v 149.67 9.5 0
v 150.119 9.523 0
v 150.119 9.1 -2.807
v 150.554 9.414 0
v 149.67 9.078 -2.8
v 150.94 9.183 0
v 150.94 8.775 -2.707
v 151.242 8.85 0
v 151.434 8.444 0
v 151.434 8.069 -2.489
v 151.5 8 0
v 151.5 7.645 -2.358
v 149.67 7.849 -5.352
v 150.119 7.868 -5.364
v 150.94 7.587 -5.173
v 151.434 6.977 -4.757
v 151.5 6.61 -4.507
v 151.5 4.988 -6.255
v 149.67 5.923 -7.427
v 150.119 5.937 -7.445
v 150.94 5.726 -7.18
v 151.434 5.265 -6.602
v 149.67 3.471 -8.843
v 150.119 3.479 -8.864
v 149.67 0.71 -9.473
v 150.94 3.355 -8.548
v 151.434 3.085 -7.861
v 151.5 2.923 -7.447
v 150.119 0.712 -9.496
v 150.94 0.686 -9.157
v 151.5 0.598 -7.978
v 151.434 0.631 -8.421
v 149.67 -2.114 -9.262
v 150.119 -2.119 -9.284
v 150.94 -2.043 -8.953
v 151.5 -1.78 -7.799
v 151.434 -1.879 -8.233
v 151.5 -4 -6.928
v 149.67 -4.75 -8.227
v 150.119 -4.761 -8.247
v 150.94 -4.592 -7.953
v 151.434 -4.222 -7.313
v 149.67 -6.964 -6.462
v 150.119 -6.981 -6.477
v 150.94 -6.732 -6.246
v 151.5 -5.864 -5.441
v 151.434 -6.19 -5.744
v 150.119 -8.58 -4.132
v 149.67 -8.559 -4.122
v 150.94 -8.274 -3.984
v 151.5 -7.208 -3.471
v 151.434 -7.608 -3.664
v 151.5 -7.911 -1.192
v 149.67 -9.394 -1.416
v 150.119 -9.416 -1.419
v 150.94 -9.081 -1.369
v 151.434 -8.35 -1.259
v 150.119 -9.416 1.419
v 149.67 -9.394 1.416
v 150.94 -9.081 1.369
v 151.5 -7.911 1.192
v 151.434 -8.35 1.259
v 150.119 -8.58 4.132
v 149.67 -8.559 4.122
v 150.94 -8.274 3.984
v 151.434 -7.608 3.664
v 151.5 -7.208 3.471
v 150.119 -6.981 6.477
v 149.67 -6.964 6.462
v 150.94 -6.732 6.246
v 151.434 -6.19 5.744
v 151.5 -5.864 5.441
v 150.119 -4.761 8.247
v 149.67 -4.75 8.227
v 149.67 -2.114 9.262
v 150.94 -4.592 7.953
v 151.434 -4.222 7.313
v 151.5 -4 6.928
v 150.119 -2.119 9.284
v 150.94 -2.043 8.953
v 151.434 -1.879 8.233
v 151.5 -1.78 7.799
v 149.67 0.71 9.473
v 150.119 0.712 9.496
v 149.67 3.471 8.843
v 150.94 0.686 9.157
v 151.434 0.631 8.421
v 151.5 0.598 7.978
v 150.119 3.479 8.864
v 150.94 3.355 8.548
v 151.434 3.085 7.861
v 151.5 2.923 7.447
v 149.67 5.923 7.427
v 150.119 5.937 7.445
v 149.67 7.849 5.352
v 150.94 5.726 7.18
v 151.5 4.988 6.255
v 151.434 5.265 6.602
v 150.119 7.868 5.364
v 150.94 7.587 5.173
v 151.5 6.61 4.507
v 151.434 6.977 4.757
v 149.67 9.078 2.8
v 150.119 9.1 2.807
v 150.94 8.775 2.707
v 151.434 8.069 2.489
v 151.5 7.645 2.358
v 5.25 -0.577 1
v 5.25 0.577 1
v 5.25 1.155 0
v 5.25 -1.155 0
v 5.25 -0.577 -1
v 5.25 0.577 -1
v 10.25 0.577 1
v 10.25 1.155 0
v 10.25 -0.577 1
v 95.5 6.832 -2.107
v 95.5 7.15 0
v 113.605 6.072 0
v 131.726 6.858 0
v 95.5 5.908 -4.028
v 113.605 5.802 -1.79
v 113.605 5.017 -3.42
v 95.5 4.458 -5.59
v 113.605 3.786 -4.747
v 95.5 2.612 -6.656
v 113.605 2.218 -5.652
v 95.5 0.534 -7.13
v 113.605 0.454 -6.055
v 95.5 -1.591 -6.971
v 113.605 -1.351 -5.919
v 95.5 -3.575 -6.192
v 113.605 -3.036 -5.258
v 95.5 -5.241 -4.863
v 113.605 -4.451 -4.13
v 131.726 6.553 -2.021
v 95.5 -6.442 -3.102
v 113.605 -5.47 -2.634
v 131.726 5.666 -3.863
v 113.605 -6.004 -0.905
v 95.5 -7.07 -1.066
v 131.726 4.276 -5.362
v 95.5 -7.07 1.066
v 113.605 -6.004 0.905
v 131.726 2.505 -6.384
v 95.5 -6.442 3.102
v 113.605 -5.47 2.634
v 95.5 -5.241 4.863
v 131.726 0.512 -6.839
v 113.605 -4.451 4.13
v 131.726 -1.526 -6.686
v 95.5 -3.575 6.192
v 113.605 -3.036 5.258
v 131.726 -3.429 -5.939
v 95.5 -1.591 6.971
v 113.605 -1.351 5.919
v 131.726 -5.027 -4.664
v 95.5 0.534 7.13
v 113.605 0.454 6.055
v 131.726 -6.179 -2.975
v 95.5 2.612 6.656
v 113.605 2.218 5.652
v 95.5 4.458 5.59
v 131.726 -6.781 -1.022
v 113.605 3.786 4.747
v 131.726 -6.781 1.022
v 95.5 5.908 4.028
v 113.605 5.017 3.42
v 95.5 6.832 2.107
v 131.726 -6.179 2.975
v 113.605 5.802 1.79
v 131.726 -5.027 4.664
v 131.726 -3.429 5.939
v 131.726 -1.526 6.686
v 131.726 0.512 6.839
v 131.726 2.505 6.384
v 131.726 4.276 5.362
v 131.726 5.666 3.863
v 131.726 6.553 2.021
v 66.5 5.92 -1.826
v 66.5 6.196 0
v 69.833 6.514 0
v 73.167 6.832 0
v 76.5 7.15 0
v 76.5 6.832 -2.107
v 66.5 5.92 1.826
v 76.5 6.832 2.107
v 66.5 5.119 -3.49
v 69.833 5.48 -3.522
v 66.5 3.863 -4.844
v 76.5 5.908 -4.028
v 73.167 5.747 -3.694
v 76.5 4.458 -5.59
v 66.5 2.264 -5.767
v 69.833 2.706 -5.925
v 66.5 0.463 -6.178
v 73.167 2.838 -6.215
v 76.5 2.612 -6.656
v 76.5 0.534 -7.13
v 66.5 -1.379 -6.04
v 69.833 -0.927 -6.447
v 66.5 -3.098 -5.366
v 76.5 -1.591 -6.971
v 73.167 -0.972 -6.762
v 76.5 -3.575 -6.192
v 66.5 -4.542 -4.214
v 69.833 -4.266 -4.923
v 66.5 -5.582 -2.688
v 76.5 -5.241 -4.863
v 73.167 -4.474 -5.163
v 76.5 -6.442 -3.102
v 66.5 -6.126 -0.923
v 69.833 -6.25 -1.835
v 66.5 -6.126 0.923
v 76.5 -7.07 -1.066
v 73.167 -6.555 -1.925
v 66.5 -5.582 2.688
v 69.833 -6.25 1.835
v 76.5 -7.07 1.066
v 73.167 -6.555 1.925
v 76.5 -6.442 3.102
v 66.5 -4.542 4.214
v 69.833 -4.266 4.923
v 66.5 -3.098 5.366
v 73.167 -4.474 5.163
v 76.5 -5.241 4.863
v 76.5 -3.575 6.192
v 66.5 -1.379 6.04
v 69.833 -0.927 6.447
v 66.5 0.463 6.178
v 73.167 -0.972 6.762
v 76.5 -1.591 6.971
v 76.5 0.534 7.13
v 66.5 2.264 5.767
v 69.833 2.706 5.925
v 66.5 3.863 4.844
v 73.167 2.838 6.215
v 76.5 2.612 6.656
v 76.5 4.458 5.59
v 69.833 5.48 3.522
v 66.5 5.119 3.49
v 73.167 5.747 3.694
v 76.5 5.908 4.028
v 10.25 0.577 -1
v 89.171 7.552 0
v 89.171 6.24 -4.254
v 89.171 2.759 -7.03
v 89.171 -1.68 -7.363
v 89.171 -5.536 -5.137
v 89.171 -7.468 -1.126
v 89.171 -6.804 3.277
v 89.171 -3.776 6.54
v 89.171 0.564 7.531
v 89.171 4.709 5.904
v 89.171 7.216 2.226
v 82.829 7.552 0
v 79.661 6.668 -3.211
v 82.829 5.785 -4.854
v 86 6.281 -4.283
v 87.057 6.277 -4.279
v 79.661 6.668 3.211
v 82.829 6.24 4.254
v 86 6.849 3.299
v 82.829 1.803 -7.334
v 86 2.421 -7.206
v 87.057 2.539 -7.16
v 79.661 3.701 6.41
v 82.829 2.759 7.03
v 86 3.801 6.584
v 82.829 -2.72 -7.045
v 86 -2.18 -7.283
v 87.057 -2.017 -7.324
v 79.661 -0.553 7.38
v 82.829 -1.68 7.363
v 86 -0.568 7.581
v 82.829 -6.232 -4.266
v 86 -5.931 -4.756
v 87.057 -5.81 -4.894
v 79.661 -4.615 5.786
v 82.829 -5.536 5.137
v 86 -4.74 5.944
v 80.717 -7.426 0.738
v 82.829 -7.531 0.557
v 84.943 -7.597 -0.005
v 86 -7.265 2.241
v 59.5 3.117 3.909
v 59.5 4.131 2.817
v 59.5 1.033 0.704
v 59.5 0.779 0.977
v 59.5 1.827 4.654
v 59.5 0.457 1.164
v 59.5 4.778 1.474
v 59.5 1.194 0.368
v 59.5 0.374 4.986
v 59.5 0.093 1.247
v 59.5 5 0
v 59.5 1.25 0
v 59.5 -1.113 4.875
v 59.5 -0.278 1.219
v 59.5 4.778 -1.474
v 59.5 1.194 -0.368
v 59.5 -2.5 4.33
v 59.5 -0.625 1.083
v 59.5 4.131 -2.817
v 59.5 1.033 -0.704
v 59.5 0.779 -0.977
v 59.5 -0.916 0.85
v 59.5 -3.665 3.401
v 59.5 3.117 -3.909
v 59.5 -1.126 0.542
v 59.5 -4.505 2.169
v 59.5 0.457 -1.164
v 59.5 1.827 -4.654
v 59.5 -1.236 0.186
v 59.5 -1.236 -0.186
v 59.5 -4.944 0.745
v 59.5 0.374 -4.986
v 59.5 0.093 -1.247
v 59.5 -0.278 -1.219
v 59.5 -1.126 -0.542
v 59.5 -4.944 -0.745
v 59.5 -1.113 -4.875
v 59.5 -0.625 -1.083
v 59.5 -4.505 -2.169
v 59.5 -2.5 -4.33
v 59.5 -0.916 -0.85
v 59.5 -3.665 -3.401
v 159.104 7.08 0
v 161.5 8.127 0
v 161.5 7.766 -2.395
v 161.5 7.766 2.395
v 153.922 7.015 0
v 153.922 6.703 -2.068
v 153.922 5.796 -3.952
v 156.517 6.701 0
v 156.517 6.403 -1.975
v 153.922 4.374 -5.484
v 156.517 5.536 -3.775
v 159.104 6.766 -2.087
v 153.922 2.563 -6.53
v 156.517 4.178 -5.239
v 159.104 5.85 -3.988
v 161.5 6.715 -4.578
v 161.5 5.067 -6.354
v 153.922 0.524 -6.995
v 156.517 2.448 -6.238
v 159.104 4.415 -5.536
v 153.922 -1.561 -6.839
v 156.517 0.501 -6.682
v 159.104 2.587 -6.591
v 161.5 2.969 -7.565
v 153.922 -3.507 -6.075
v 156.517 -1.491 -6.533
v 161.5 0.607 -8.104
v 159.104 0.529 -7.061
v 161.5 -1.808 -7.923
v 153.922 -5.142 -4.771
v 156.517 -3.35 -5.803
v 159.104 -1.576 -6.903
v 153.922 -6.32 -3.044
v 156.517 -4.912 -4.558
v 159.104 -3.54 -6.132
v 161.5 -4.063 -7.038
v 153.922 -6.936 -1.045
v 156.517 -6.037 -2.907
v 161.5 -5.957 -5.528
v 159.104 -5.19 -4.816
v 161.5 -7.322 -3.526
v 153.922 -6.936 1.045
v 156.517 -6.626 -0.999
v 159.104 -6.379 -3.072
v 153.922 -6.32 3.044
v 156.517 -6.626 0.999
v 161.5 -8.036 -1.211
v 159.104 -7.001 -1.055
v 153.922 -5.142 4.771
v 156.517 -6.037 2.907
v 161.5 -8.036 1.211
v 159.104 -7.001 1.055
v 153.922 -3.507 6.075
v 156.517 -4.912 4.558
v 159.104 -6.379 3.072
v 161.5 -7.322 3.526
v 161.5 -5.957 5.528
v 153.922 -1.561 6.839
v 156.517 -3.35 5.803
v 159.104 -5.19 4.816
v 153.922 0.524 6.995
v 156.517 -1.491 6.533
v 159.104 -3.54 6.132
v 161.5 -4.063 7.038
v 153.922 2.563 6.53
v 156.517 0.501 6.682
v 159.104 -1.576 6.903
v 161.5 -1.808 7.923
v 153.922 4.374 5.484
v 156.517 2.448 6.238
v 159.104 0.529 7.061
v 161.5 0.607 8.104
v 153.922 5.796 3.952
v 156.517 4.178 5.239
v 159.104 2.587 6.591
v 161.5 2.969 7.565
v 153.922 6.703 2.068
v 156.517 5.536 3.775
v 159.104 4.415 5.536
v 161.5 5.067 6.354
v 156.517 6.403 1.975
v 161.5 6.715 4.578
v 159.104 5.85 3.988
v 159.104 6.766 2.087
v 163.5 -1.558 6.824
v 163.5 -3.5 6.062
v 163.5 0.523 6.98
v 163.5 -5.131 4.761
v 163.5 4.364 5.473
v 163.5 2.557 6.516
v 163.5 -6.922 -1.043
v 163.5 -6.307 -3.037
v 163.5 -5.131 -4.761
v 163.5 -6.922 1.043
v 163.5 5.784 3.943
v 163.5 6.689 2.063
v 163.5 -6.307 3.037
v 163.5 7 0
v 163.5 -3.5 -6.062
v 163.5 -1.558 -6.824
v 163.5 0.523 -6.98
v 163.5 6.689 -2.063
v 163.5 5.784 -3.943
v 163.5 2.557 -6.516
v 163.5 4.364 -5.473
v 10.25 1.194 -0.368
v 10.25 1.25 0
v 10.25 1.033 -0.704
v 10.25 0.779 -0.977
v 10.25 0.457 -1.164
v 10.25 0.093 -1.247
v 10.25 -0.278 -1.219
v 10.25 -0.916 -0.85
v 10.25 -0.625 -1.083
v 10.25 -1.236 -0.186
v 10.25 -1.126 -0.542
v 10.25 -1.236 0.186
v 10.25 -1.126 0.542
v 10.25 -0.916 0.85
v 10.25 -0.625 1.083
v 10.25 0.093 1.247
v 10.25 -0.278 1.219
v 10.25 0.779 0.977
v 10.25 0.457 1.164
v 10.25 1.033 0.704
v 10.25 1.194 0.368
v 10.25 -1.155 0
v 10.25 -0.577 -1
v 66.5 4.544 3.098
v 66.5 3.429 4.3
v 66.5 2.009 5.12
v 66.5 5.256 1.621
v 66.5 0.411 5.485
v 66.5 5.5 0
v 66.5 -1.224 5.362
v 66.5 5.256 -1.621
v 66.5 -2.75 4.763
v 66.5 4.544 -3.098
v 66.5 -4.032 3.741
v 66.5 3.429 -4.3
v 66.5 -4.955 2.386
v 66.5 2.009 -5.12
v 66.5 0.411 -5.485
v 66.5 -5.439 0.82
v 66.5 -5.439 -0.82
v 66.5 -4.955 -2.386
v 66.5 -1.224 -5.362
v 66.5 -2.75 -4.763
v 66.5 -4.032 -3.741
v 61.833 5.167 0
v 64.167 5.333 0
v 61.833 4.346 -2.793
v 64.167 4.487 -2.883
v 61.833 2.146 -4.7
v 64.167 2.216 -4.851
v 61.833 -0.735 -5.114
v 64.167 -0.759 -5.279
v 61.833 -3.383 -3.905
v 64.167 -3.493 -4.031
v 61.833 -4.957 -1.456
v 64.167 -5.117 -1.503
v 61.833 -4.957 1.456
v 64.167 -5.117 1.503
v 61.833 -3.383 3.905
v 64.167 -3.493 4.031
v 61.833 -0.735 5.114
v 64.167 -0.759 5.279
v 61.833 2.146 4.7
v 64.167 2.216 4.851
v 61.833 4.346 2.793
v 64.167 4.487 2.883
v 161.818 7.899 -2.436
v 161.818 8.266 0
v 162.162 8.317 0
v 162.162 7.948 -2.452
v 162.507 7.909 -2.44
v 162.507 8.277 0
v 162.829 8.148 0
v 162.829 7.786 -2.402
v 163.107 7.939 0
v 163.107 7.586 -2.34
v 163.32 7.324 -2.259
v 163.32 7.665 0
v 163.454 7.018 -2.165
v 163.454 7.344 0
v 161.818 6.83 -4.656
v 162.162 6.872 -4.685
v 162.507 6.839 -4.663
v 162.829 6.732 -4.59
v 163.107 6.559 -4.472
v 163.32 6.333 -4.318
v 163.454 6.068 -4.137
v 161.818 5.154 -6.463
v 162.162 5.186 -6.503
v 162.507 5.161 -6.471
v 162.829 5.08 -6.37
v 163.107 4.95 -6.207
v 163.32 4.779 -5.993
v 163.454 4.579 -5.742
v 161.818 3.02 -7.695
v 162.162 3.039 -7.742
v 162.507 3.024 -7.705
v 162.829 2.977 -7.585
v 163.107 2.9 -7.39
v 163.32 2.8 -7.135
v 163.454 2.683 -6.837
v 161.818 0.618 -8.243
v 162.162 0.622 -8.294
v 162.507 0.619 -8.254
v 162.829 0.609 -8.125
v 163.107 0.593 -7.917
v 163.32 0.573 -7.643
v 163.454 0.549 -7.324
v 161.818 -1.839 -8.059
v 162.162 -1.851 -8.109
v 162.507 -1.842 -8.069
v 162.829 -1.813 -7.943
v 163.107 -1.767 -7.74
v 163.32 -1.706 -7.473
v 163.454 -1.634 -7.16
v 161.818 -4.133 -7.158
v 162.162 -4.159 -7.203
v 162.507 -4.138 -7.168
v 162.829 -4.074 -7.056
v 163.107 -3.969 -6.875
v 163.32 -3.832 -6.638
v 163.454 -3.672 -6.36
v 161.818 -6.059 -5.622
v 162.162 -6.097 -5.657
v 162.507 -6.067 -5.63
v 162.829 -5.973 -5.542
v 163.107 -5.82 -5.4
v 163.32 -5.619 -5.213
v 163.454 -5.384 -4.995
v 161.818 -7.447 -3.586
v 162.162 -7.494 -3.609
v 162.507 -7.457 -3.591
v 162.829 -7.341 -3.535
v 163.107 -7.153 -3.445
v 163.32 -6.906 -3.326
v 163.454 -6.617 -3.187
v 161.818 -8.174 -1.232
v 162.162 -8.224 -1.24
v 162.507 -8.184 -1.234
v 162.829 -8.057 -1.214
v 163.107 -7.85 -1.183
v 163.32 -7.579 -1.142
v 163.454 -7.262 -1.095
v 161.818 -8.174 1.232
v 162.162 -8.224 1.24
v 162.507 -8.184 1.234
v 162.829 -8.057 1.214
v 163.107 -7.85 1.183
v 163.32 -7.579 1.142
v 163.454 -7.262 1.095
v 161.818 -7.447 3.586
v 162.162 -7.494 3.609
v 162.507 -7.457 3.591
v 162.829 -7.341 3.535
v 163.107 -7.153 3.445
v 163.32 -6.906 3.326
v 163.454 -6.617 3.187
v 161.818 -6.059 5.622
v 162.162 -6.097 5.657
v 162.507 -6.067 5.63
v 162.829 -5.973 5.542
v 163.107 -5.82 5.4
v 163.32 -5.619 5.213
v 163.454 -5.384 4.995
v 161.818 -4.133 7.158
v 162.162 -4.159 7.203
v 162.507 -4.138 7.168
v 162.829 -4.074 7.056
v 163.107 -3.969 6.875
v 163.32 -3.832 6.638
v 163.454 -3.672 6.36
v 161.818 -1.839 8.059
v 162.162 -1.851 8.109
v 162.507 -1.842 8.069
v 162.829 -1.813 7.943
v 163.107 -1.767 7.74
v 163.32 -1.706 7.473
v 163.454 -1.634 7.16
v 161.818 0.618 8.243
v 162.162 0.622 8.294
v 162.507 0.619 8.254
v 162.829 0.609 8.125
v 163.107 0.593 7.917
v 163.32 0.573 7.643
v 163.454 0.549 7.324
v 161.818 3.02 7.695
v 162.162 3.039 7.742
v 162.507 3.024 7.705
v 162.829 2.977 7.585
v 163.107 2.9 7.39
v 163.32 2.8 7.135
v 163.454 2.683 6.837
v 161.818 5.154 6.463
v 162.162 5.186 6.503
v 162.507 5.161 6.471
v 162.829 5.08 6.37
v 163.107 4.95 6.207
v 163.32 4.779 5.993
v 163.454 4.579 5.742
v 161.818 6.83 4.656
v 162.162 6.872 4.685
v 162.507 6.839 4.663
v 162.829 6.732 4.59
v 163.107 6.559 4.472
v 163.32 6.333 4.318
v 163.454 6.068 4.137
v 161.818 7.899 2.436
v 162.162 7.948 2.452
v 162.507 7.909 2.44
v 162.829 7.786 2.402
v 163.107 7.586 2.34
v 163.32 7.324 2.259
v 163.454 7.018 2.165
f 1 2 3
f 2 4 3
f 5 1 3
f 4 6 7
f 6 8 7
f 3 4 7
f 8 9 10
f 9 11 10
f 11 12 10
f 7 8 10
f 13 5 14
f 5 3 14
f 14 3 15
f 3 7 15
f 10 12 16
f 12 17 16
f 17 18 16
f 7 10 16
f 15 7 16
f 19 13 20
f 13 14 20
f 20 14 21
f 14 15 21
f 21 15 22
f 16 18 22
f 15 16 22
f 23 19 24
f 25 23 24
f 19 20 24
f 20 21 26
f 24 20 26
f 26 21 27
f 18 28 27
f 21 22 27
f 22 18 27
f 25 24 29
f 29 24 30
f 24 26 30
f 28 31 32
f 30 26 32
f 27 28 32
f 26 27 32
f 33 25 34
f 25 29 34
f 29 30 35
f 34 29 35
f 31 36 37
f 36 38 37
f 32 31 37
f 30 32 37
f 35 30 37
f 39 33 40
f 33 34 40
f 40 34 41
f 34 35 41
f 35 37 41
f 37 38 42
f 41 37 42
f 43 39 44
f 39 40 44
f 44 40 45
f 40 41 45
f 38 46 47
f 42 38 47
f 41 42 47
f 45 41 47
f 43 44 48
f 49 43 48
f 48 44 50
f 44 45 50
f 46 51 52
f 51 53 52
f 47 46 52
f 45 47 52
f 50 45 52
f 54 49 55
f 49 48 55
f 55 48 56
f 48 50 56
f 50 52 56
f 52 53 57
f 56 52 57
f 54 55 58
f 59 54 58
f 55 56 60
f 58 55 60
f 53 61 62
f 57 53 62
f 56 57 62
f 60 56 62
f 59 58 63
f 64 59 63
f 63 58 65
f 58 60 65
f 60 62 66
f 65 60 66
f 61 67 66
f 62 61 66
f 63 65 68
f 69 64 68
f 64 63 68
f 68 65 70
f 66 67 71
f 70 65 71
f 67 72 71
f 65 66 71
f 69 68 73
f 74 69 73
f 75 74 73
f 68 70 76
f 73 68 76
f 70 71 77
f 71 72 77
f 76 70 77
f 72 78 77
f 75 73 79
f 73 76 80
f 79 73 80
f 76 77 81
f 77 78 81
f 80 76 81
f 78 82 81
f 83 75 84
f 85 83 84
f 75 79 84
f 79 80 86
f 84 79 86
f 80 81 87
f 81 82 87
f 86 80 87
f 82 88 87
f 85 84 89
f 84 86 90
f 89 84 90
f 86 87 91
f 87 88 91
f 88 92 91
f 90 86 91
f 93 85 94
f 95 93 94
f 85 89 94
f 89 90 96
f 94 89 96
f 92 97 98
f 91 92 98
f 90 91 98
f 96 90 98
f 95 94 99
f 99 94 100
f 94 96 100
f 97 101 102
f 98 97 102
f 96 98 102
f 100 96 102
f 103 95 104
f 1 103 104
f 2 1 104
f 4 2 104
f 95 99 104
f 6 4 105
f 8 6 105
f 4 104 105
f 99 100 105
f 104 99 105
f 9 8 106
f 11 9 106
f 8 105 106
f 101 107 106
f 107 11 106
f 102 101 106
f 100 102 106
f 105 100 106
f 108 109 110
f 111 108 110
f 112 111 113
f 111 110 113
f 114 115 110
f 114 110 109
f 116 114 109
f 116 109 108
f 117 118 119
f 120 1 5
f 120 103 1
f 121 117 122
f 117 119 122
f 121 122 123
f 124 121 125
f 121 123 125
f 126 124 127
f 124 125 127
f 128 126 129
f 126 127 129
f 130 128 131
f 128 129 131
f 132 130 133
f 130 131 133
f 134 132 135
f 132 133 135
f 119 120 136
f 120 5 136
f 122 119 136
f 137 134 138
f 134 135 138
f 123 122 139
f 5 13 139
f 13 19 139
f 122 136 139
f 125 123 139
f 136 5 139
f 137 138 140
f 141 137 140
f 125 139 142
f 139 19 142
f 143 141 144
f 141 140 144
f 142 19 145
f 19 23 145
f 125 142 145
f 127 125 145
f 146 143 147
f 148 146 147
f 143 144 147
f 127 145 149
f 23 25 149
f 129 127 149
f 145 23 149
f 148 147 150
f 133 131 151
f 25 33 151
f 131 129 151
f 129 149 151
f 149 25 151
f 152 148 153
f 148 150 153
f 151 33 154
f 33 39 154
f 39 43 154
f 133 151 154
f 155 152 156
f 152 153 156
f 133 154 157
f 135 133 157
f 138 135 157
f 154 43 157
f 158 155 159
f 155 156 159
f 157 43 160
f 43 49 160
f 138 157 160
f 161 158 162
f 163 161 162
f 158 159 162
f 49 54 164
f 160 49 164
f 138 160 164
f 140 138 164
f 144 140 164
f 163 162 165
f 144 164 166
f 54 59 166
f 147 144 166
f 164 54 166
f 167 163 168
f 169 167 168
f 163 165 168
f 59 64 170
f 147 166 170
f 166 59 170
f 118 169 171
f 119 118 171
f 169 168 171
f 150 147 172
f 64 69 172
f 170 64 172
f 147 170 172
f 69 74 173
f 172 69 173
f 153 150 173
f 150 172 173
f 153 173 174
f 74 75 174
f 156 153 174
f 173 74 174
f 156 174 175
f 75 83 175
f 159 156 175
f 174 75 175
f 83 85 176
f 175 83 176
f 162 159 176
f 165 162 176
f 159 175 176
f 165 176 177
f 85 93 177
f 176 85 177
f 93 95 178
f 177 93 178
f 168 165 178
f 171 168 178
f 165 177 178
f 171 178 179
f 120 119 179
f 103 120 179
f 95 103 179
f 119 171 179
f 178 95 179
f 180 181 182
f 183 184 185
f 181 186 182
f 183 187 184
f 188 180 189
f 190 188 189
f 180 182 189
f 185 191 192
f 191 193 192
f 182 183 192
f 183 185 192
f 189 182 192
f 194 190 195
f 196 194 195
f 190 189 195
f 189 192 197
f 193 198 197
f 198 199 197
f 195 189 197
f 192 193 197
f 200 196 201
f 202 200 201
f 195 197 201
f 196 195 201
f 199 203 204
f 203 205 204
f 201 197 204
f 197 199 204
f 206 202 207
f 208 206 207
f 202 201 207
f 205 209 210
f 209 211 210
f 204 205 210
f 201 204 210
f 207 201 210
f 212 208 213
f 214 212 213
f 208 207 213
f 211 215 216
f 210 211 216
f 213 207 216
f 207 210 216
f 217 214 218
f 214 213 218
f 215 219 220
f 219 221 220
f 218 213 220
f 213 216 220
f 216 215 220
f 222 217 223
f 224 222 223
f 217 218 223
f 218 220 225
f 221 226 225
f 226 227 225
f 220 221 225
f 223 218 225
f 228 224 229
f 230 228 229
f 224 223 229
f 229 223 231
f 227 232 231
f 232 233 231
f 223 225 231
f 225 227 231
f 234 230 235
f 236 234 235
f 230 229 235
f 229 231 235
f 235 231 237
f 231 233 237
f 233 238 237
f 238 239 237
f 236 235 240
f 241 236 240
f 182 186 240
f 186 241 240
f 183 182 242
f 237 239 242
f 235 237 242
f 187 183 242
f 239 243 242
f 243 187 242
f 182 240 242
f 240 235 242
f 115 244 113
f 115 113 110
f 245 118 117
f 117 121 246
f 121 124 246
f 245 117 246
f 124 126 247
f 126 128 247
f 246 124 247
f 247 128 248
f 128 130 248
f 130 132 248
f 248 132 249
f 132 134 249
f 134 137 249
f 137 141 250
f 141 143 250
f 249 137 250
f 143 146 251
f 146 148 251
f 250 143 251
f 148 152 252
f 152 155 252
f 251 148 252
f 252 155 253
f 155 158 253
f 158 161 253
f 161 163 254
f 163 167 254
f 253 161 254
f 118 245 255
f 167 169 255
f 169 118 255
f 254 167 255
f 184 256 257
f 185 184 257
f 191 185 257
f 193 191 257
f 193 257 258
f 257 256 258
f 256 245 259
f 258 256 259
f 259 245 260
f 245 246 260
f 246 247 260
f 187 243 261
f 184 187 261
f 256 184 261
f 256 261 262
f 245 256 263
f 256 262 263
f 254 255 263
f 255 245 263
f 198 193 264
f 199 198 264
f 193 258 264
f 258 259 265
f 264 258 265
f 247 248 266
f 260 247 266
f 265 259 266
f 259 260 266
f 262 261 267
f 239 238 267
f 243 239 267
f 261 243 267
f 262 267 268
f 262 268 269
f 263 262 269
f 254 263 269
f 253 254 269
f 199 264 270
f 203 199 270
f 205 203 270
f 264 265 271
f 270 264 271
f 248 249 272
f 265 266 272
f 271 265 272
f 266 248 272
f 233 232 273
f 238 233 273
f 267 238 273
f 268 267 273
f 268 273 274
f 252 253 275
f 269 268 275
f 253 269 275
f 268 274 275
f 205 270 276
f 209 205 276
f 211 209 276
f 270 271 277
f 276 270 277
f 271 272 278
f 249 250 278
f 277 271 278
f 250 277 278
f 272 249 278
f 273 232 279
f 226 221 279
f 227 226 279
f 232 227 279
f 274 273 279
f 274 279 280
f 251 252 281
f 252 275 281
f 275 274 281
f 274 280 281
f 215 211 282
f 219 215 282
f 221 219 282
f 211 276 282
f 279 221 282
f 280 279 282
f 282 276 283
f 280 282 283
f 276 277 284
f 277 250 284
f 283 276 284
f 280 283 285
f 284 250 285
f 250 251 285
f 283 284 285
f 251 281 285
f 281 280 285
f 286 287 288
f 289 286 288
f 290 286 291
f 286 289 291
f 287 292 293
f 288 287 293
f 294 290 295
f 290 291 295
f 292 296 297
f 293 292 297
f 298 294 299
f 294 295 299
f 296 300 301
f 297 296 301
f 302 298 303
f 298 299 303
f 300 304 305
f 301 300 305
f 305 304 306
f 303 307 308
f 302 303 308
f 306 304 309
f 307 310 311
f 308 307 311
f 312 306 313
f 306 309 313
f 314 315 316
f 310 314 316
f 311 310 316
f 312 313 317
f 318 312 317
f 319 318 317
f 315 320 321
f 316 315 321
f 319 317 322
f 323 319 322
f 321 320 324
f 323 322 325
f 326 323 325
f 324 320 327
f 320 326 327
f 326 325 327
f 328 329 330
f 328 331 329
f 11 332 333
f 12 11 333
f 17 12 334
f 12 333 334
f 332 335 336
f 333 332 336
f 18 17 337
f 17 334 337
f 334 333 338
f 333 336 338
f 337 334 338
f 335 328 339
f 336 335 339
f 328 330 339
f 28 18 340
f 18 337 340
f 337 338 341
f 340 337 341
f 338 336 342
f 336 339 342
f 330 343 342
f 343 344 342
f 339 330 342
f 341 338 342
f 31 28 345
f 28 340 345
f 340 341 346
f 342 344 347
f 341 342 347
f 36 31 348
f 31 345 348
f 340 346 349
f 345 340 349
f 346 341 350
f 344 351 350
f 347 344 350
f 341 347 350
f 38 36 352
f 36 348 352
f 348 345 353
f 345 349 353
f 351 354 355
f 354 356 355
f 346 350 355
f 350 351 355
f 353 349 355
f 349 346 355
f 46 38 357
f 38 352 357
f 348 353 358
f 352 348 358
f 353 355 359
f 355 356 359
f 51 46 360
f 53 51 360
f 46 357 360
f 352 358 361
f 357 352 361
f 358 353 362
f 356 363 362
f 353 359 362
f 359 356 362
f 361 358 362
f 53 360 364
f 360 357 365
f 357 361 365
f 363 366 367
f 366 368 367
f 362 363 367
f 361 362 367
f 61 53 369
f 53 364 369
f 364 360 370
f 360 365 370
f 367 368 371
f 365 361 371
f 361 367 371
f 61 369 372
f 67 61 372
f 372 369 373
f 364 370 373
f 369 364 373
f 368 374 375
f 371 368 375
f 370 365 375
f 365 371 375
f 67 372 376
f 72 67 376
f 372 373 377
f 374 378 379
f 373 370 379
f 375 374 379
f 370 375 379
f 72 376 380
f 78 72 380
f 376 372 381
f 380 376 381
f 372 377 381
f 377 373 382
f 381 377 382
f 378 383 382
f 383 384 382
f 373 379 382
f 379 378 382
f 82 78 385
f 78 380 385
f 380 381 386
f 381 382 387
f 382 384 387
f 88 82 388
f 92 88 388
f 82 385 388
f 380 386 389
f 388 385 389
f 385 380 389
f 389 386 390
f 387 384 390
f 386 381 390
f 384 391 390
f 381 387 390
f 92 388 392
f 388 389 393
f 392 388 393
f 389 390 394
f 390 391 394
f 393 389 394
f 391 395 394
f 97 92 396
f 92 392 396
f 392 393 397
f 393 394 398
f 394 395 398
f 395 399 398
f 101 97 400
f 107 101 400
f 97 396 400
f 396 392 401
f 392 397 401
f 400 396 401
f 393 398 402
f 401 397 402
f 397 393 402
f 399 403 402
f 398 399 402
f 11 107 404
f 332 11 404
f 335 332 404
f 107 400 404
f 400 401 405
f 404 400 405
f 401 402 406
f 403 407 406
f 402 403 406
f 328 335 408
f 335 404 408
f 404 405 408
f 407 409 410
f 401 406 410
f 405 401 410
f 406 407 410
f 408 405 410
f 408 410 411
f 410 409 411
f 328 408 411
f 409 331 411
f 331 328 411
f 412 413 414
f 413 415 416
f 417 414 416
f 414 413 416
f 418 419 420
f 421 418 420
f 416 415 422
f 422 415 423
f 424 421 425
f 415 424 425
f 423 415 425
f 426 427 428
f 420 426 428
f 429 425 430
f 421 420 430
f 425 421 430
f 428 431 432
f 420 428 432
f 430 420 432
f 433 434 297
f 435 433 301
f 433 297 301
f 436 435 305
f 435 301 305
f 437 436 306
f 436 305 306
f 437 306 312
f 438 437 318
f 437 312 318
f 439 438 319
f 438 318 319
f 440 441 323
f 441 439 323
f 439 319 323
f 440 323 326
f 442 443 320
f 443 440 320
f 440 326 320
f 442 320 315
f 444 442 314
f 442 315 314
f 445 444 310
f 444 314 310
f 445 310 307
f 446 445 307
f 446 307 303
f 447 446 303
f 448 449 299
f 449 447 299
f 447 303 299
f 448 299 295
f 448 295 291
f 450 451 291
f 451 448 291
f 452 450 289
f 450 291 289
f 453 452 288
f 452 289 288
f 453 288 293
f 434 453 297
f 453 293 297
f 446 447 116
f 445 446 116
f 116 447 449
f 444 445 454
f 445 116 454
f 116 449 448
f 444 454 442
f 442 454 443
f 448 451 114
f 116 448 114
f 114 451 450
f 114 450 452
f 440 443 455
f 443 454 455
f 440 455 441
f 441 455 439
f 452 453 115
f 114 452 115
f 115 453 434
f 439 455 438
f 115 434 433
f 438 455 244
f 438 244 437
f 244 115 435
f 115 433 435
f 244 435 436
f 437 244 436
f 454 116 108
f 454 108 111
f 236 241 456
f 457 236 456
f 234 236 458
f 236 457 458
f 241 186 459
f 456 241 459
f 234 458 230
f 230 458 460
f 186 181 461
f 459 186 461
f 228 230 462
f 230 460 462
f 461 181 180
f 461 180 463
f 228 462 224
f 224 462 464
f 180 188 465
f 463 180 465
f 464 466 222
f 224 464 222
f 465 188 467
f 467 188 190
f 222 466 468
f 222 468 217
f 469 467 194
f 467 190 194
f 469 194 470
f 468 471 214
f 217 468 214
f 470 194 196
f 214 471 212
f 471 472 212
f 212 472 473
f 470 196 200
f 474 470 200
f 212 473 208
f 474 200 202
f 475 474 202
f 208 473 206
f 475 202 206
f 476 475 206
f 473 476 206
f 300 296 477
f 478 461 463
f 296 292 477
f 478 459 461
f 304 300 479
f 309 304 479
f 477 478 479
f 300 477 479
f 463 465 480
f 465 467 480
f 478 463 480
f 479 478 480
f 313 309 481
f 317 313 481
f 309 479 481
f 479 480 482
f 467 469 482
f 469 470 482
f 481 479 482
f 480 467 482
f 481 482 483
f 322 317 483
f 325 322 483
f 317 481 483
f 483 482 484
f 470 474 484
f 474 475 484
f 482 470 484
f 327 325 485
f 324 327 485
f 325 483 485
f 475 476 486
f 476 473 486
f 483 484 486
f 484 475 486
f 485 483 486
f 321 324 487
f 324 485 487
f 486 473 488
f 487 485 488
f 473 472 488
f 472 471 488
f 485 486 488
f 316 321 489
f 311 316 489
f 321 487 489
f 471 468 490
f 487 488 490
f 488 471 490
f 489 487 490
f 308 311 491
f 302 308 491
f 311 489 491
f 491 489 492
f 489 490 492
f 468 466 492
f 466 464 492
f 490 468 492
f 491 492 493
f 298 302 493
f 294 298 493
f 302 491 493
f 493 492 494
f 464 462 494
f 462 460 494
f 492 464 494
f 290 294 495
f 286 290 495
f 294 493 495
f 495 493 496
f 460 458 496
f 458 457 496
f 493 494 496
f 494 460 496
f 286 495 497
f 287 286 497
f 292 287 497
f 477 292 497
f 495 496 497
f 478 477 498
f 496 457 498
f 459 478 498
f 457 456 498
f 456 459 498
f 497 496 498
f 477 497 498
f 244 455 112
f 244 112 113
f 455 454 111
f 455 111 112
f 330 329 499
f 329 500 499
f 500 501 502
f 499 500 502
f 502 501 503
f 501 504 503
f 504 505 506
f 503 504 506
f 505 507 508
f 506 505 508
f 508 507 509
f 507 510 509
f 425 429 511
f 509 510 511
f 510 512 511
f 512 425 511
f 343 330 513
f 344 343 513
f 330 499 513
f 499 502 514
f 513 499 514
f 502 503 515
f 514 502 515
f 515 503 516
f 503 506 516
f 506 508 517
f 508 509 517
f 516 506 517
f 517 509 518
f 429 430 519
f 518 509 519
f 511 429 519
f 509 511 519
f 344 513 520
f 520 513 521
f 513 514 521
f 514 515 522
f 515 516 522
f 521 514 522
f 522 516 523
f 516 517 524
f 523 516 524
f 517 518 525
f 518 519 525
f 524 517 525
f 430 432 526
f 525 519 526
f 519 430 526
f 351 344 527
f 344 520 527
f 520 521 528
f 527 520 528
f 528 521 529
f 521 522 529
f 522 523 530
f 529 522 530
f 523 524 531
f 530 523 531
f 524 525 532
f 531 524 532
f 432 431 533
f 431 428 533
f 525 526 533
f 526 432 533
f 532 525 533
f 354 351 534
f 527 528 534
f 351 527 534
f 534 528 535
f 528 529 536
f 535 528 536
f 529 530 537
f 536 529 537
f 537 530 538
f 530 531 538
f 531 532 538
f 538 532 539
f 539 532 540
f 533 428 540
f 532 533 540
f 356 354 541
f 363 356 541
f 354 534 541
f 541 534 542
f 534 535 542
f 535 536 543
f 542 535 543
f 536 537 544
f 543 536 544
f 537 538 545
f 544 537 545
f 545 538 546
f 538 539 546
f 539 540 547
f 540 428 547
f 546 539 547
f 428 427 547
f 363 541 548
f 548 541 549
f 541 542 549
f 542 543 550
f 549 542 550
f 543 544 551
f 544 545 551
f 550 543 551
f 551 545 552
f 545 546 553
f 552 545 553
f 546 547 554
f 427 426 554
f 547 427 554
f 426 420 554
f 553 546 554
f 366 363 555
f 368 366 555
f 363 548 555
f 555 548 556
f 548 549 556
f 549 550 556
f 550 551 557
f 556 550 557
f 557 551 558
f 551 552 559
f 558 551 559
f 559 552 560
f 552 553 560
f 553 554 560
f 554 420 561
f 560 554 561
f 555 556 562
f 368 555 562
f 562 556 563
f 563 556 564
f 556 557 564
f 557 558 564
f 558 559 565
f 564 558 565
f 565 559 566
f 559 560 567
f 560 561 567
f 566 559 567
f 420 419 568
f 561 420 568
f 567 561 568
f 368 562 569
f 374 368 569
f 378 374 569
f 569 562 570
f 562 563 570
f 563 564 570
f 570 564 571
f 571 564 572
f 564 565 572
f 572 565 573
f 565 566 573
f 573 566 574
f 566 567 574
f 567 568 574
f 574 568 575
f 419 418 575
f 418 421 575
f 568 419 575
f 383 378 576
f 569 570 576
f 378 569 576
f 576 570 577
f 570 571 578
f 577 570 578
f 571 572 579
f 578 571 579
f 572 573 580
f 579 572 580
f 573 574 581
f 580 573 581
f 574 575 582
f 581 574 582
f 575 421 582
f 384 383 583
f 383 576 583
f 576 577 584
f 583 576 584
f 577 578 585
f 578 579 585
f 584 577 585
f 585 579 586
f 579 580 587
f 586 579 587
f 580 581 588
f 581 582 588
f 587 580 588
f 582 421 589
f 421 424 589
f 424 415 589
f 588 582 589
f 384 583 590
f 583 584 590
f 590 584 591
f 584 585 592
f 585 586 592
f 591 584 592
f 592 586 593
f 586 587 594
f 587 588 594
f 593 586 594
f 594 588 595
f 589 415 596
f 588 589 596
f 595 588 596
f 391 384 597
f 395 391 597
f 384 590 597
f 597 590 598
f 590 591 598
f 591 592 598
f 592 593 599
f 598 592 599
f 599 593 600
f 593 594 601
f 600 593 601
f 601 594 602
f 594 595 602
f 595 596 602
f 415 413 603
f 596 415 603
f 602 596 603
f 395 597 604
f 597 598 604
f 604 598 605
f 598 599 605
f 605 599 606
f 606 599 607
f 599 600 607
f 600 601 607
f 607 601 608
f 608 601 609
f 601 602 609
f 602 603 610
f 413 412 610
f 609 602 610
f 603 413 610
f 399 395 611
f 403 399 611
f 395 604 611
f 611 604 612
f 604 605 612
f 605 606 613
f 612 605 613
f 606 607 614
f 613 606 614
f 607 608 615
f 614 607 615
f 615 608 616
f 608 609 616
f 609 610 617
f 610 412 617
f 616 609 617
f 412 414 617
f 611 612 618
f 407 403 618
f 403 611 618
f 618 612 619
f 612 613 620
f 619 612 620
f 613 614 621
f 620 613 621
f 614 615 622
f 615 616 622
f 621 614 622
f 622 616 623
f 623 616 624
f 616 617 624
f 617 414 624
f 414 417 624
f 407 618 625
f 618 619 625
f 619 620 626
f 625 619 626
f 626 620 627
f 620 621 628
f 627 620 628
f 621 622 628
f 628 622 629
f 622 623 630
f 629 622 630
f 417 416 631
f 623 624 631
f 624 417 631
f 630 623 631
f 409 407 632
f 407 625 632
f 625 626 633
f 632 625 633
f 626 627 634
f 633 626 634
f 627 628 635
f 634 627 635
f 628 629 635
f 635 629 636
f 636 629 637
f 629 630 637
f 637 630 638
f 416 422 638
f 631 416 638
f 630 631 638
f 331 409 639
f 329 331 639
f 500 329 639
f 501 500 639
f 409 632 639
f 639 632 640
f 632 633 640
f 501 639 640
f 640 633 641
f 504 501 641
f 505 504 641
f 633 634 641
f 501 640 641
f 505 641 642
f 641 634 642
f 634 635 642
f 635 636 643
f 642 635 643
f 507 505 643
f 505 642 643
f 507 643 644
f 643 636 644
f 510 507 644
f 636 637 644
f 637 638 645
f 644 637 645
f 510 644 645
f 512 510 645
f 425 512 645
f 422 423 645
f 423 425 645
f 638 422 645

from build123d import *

# Parameters (mm, degrees)
SKETCH1_W           = 54.5
SKETCH1_H           = 1.25
HEXAGONALHEAD_DEPTH = 5.25
BOSS_EXTRUDE1_DEPTH = 5


with BuildPart() as part:
    # Sketch1 → AluminiumPart (revolve)
    with BuildSketch(Plane.XY):
        with Locations((32.25, 0.625)):
            Rectangle(SKETCH1_W, SKETCH1_H)
    revolve(axis=Axis((184.722030444, 0, 0), (-1, 0, 0)))

    # Sketch2 → HexagonalHead (cut)
    with BuildSketch(Plane.ZY.offset(-5)):
        Polygon((-2.8, 1.616580754), (0, 3.233161507), (2.8, 1.616580754), (2.8, -1.616580754), (0, -3.233161507), (-2.8, -1.616580754), align=None)
    extrude(amount=-HEXAGONALHEAD_DEPTH, mode=Mode.SUBTRACT)

    # Sketch4 → FirstGreenPart (revolve)
    with BuildSketch(Plane.XY):
        Polygon((59.5, 0), (59.5, 5), (66.5, 5.5), (66.5, 0), align=None)
    revolve(axis=Axis((184.722030444, 0, 0), (-1, 0, 0)))

    # Sketch5 → FirstBlackPart (revolve)
    with BuildSketch(Plane.XY):
        with BuildLine():
            Line((66.5, 6.195683888), (76.5, 7.15))
            ThreePointArc((76.5, 7.15), (86, 7.602272753), (95.5, 7.15))
            Line((95.5, 7.15), (95.5, 0))
            Line((95.5, 0), (66.5, 0))
            Line((66.5, 0), (66.5, 6.195683888))
        make_face()
    revolve(axis=Axis((184.722030444, 0, 0), (-1, 0, 0)))

    # Sketch6 → SecondGreenPart (revolve)
    with BuildSketch(Plane.XY):
        with BuildLine():
            Line((151.5, 8), (151.5, 0))
            Line((151.5, 0), (95.5, 0))
            Line((95.5, 0), (95.5, 7.15))
            ThreePointArc((95.5, 7.15), (122.675746685, 6.231641521), (149.66986499, 9.5))
            ThreePointArc((149.66986499, 9.5), (150.939948886, 9.183151951), (151.5, 8))
        make_face()
    revolve(axis=Axis((184.722030444, 0, 0), (-1, 0, 0)))

    # Sketch7 → LastBlackPart (revolve)
    with BuildSketch(Plane.XY):
        with BuildLine():
            Line((151.5, 0), (151.5, 8))
            ThreePointArc((151.5, 8), (156.517257353, 6.700790451), (161.5, 8.126655981))
            ThreePointArc((161.5, 8.126655981), (162.829223328, 8.147753643), (163.5, 7))
            Line((163.5, 7), (163.5, 0))
            Line((163.5, 0), (151.5, 0))
        make_face()
    revolve(axis=Axis((184.722030444, 0, 0), (-1, 0, 0)))

    # Sketch8 → Boss-Extrude1 (add)
    with BuildSketch(Plane.ZY.offset(-10.25)):
        Polygon((-1, 0.577350269), (0, 1.154700538), (1, 0.577350269), (1, -0.577350269), (0, -1.154700538), (-1, -0.577350269), align=None)
    extrude(amount=BOSS_EXTRUDE1_DEPTH)


solid = part.part
